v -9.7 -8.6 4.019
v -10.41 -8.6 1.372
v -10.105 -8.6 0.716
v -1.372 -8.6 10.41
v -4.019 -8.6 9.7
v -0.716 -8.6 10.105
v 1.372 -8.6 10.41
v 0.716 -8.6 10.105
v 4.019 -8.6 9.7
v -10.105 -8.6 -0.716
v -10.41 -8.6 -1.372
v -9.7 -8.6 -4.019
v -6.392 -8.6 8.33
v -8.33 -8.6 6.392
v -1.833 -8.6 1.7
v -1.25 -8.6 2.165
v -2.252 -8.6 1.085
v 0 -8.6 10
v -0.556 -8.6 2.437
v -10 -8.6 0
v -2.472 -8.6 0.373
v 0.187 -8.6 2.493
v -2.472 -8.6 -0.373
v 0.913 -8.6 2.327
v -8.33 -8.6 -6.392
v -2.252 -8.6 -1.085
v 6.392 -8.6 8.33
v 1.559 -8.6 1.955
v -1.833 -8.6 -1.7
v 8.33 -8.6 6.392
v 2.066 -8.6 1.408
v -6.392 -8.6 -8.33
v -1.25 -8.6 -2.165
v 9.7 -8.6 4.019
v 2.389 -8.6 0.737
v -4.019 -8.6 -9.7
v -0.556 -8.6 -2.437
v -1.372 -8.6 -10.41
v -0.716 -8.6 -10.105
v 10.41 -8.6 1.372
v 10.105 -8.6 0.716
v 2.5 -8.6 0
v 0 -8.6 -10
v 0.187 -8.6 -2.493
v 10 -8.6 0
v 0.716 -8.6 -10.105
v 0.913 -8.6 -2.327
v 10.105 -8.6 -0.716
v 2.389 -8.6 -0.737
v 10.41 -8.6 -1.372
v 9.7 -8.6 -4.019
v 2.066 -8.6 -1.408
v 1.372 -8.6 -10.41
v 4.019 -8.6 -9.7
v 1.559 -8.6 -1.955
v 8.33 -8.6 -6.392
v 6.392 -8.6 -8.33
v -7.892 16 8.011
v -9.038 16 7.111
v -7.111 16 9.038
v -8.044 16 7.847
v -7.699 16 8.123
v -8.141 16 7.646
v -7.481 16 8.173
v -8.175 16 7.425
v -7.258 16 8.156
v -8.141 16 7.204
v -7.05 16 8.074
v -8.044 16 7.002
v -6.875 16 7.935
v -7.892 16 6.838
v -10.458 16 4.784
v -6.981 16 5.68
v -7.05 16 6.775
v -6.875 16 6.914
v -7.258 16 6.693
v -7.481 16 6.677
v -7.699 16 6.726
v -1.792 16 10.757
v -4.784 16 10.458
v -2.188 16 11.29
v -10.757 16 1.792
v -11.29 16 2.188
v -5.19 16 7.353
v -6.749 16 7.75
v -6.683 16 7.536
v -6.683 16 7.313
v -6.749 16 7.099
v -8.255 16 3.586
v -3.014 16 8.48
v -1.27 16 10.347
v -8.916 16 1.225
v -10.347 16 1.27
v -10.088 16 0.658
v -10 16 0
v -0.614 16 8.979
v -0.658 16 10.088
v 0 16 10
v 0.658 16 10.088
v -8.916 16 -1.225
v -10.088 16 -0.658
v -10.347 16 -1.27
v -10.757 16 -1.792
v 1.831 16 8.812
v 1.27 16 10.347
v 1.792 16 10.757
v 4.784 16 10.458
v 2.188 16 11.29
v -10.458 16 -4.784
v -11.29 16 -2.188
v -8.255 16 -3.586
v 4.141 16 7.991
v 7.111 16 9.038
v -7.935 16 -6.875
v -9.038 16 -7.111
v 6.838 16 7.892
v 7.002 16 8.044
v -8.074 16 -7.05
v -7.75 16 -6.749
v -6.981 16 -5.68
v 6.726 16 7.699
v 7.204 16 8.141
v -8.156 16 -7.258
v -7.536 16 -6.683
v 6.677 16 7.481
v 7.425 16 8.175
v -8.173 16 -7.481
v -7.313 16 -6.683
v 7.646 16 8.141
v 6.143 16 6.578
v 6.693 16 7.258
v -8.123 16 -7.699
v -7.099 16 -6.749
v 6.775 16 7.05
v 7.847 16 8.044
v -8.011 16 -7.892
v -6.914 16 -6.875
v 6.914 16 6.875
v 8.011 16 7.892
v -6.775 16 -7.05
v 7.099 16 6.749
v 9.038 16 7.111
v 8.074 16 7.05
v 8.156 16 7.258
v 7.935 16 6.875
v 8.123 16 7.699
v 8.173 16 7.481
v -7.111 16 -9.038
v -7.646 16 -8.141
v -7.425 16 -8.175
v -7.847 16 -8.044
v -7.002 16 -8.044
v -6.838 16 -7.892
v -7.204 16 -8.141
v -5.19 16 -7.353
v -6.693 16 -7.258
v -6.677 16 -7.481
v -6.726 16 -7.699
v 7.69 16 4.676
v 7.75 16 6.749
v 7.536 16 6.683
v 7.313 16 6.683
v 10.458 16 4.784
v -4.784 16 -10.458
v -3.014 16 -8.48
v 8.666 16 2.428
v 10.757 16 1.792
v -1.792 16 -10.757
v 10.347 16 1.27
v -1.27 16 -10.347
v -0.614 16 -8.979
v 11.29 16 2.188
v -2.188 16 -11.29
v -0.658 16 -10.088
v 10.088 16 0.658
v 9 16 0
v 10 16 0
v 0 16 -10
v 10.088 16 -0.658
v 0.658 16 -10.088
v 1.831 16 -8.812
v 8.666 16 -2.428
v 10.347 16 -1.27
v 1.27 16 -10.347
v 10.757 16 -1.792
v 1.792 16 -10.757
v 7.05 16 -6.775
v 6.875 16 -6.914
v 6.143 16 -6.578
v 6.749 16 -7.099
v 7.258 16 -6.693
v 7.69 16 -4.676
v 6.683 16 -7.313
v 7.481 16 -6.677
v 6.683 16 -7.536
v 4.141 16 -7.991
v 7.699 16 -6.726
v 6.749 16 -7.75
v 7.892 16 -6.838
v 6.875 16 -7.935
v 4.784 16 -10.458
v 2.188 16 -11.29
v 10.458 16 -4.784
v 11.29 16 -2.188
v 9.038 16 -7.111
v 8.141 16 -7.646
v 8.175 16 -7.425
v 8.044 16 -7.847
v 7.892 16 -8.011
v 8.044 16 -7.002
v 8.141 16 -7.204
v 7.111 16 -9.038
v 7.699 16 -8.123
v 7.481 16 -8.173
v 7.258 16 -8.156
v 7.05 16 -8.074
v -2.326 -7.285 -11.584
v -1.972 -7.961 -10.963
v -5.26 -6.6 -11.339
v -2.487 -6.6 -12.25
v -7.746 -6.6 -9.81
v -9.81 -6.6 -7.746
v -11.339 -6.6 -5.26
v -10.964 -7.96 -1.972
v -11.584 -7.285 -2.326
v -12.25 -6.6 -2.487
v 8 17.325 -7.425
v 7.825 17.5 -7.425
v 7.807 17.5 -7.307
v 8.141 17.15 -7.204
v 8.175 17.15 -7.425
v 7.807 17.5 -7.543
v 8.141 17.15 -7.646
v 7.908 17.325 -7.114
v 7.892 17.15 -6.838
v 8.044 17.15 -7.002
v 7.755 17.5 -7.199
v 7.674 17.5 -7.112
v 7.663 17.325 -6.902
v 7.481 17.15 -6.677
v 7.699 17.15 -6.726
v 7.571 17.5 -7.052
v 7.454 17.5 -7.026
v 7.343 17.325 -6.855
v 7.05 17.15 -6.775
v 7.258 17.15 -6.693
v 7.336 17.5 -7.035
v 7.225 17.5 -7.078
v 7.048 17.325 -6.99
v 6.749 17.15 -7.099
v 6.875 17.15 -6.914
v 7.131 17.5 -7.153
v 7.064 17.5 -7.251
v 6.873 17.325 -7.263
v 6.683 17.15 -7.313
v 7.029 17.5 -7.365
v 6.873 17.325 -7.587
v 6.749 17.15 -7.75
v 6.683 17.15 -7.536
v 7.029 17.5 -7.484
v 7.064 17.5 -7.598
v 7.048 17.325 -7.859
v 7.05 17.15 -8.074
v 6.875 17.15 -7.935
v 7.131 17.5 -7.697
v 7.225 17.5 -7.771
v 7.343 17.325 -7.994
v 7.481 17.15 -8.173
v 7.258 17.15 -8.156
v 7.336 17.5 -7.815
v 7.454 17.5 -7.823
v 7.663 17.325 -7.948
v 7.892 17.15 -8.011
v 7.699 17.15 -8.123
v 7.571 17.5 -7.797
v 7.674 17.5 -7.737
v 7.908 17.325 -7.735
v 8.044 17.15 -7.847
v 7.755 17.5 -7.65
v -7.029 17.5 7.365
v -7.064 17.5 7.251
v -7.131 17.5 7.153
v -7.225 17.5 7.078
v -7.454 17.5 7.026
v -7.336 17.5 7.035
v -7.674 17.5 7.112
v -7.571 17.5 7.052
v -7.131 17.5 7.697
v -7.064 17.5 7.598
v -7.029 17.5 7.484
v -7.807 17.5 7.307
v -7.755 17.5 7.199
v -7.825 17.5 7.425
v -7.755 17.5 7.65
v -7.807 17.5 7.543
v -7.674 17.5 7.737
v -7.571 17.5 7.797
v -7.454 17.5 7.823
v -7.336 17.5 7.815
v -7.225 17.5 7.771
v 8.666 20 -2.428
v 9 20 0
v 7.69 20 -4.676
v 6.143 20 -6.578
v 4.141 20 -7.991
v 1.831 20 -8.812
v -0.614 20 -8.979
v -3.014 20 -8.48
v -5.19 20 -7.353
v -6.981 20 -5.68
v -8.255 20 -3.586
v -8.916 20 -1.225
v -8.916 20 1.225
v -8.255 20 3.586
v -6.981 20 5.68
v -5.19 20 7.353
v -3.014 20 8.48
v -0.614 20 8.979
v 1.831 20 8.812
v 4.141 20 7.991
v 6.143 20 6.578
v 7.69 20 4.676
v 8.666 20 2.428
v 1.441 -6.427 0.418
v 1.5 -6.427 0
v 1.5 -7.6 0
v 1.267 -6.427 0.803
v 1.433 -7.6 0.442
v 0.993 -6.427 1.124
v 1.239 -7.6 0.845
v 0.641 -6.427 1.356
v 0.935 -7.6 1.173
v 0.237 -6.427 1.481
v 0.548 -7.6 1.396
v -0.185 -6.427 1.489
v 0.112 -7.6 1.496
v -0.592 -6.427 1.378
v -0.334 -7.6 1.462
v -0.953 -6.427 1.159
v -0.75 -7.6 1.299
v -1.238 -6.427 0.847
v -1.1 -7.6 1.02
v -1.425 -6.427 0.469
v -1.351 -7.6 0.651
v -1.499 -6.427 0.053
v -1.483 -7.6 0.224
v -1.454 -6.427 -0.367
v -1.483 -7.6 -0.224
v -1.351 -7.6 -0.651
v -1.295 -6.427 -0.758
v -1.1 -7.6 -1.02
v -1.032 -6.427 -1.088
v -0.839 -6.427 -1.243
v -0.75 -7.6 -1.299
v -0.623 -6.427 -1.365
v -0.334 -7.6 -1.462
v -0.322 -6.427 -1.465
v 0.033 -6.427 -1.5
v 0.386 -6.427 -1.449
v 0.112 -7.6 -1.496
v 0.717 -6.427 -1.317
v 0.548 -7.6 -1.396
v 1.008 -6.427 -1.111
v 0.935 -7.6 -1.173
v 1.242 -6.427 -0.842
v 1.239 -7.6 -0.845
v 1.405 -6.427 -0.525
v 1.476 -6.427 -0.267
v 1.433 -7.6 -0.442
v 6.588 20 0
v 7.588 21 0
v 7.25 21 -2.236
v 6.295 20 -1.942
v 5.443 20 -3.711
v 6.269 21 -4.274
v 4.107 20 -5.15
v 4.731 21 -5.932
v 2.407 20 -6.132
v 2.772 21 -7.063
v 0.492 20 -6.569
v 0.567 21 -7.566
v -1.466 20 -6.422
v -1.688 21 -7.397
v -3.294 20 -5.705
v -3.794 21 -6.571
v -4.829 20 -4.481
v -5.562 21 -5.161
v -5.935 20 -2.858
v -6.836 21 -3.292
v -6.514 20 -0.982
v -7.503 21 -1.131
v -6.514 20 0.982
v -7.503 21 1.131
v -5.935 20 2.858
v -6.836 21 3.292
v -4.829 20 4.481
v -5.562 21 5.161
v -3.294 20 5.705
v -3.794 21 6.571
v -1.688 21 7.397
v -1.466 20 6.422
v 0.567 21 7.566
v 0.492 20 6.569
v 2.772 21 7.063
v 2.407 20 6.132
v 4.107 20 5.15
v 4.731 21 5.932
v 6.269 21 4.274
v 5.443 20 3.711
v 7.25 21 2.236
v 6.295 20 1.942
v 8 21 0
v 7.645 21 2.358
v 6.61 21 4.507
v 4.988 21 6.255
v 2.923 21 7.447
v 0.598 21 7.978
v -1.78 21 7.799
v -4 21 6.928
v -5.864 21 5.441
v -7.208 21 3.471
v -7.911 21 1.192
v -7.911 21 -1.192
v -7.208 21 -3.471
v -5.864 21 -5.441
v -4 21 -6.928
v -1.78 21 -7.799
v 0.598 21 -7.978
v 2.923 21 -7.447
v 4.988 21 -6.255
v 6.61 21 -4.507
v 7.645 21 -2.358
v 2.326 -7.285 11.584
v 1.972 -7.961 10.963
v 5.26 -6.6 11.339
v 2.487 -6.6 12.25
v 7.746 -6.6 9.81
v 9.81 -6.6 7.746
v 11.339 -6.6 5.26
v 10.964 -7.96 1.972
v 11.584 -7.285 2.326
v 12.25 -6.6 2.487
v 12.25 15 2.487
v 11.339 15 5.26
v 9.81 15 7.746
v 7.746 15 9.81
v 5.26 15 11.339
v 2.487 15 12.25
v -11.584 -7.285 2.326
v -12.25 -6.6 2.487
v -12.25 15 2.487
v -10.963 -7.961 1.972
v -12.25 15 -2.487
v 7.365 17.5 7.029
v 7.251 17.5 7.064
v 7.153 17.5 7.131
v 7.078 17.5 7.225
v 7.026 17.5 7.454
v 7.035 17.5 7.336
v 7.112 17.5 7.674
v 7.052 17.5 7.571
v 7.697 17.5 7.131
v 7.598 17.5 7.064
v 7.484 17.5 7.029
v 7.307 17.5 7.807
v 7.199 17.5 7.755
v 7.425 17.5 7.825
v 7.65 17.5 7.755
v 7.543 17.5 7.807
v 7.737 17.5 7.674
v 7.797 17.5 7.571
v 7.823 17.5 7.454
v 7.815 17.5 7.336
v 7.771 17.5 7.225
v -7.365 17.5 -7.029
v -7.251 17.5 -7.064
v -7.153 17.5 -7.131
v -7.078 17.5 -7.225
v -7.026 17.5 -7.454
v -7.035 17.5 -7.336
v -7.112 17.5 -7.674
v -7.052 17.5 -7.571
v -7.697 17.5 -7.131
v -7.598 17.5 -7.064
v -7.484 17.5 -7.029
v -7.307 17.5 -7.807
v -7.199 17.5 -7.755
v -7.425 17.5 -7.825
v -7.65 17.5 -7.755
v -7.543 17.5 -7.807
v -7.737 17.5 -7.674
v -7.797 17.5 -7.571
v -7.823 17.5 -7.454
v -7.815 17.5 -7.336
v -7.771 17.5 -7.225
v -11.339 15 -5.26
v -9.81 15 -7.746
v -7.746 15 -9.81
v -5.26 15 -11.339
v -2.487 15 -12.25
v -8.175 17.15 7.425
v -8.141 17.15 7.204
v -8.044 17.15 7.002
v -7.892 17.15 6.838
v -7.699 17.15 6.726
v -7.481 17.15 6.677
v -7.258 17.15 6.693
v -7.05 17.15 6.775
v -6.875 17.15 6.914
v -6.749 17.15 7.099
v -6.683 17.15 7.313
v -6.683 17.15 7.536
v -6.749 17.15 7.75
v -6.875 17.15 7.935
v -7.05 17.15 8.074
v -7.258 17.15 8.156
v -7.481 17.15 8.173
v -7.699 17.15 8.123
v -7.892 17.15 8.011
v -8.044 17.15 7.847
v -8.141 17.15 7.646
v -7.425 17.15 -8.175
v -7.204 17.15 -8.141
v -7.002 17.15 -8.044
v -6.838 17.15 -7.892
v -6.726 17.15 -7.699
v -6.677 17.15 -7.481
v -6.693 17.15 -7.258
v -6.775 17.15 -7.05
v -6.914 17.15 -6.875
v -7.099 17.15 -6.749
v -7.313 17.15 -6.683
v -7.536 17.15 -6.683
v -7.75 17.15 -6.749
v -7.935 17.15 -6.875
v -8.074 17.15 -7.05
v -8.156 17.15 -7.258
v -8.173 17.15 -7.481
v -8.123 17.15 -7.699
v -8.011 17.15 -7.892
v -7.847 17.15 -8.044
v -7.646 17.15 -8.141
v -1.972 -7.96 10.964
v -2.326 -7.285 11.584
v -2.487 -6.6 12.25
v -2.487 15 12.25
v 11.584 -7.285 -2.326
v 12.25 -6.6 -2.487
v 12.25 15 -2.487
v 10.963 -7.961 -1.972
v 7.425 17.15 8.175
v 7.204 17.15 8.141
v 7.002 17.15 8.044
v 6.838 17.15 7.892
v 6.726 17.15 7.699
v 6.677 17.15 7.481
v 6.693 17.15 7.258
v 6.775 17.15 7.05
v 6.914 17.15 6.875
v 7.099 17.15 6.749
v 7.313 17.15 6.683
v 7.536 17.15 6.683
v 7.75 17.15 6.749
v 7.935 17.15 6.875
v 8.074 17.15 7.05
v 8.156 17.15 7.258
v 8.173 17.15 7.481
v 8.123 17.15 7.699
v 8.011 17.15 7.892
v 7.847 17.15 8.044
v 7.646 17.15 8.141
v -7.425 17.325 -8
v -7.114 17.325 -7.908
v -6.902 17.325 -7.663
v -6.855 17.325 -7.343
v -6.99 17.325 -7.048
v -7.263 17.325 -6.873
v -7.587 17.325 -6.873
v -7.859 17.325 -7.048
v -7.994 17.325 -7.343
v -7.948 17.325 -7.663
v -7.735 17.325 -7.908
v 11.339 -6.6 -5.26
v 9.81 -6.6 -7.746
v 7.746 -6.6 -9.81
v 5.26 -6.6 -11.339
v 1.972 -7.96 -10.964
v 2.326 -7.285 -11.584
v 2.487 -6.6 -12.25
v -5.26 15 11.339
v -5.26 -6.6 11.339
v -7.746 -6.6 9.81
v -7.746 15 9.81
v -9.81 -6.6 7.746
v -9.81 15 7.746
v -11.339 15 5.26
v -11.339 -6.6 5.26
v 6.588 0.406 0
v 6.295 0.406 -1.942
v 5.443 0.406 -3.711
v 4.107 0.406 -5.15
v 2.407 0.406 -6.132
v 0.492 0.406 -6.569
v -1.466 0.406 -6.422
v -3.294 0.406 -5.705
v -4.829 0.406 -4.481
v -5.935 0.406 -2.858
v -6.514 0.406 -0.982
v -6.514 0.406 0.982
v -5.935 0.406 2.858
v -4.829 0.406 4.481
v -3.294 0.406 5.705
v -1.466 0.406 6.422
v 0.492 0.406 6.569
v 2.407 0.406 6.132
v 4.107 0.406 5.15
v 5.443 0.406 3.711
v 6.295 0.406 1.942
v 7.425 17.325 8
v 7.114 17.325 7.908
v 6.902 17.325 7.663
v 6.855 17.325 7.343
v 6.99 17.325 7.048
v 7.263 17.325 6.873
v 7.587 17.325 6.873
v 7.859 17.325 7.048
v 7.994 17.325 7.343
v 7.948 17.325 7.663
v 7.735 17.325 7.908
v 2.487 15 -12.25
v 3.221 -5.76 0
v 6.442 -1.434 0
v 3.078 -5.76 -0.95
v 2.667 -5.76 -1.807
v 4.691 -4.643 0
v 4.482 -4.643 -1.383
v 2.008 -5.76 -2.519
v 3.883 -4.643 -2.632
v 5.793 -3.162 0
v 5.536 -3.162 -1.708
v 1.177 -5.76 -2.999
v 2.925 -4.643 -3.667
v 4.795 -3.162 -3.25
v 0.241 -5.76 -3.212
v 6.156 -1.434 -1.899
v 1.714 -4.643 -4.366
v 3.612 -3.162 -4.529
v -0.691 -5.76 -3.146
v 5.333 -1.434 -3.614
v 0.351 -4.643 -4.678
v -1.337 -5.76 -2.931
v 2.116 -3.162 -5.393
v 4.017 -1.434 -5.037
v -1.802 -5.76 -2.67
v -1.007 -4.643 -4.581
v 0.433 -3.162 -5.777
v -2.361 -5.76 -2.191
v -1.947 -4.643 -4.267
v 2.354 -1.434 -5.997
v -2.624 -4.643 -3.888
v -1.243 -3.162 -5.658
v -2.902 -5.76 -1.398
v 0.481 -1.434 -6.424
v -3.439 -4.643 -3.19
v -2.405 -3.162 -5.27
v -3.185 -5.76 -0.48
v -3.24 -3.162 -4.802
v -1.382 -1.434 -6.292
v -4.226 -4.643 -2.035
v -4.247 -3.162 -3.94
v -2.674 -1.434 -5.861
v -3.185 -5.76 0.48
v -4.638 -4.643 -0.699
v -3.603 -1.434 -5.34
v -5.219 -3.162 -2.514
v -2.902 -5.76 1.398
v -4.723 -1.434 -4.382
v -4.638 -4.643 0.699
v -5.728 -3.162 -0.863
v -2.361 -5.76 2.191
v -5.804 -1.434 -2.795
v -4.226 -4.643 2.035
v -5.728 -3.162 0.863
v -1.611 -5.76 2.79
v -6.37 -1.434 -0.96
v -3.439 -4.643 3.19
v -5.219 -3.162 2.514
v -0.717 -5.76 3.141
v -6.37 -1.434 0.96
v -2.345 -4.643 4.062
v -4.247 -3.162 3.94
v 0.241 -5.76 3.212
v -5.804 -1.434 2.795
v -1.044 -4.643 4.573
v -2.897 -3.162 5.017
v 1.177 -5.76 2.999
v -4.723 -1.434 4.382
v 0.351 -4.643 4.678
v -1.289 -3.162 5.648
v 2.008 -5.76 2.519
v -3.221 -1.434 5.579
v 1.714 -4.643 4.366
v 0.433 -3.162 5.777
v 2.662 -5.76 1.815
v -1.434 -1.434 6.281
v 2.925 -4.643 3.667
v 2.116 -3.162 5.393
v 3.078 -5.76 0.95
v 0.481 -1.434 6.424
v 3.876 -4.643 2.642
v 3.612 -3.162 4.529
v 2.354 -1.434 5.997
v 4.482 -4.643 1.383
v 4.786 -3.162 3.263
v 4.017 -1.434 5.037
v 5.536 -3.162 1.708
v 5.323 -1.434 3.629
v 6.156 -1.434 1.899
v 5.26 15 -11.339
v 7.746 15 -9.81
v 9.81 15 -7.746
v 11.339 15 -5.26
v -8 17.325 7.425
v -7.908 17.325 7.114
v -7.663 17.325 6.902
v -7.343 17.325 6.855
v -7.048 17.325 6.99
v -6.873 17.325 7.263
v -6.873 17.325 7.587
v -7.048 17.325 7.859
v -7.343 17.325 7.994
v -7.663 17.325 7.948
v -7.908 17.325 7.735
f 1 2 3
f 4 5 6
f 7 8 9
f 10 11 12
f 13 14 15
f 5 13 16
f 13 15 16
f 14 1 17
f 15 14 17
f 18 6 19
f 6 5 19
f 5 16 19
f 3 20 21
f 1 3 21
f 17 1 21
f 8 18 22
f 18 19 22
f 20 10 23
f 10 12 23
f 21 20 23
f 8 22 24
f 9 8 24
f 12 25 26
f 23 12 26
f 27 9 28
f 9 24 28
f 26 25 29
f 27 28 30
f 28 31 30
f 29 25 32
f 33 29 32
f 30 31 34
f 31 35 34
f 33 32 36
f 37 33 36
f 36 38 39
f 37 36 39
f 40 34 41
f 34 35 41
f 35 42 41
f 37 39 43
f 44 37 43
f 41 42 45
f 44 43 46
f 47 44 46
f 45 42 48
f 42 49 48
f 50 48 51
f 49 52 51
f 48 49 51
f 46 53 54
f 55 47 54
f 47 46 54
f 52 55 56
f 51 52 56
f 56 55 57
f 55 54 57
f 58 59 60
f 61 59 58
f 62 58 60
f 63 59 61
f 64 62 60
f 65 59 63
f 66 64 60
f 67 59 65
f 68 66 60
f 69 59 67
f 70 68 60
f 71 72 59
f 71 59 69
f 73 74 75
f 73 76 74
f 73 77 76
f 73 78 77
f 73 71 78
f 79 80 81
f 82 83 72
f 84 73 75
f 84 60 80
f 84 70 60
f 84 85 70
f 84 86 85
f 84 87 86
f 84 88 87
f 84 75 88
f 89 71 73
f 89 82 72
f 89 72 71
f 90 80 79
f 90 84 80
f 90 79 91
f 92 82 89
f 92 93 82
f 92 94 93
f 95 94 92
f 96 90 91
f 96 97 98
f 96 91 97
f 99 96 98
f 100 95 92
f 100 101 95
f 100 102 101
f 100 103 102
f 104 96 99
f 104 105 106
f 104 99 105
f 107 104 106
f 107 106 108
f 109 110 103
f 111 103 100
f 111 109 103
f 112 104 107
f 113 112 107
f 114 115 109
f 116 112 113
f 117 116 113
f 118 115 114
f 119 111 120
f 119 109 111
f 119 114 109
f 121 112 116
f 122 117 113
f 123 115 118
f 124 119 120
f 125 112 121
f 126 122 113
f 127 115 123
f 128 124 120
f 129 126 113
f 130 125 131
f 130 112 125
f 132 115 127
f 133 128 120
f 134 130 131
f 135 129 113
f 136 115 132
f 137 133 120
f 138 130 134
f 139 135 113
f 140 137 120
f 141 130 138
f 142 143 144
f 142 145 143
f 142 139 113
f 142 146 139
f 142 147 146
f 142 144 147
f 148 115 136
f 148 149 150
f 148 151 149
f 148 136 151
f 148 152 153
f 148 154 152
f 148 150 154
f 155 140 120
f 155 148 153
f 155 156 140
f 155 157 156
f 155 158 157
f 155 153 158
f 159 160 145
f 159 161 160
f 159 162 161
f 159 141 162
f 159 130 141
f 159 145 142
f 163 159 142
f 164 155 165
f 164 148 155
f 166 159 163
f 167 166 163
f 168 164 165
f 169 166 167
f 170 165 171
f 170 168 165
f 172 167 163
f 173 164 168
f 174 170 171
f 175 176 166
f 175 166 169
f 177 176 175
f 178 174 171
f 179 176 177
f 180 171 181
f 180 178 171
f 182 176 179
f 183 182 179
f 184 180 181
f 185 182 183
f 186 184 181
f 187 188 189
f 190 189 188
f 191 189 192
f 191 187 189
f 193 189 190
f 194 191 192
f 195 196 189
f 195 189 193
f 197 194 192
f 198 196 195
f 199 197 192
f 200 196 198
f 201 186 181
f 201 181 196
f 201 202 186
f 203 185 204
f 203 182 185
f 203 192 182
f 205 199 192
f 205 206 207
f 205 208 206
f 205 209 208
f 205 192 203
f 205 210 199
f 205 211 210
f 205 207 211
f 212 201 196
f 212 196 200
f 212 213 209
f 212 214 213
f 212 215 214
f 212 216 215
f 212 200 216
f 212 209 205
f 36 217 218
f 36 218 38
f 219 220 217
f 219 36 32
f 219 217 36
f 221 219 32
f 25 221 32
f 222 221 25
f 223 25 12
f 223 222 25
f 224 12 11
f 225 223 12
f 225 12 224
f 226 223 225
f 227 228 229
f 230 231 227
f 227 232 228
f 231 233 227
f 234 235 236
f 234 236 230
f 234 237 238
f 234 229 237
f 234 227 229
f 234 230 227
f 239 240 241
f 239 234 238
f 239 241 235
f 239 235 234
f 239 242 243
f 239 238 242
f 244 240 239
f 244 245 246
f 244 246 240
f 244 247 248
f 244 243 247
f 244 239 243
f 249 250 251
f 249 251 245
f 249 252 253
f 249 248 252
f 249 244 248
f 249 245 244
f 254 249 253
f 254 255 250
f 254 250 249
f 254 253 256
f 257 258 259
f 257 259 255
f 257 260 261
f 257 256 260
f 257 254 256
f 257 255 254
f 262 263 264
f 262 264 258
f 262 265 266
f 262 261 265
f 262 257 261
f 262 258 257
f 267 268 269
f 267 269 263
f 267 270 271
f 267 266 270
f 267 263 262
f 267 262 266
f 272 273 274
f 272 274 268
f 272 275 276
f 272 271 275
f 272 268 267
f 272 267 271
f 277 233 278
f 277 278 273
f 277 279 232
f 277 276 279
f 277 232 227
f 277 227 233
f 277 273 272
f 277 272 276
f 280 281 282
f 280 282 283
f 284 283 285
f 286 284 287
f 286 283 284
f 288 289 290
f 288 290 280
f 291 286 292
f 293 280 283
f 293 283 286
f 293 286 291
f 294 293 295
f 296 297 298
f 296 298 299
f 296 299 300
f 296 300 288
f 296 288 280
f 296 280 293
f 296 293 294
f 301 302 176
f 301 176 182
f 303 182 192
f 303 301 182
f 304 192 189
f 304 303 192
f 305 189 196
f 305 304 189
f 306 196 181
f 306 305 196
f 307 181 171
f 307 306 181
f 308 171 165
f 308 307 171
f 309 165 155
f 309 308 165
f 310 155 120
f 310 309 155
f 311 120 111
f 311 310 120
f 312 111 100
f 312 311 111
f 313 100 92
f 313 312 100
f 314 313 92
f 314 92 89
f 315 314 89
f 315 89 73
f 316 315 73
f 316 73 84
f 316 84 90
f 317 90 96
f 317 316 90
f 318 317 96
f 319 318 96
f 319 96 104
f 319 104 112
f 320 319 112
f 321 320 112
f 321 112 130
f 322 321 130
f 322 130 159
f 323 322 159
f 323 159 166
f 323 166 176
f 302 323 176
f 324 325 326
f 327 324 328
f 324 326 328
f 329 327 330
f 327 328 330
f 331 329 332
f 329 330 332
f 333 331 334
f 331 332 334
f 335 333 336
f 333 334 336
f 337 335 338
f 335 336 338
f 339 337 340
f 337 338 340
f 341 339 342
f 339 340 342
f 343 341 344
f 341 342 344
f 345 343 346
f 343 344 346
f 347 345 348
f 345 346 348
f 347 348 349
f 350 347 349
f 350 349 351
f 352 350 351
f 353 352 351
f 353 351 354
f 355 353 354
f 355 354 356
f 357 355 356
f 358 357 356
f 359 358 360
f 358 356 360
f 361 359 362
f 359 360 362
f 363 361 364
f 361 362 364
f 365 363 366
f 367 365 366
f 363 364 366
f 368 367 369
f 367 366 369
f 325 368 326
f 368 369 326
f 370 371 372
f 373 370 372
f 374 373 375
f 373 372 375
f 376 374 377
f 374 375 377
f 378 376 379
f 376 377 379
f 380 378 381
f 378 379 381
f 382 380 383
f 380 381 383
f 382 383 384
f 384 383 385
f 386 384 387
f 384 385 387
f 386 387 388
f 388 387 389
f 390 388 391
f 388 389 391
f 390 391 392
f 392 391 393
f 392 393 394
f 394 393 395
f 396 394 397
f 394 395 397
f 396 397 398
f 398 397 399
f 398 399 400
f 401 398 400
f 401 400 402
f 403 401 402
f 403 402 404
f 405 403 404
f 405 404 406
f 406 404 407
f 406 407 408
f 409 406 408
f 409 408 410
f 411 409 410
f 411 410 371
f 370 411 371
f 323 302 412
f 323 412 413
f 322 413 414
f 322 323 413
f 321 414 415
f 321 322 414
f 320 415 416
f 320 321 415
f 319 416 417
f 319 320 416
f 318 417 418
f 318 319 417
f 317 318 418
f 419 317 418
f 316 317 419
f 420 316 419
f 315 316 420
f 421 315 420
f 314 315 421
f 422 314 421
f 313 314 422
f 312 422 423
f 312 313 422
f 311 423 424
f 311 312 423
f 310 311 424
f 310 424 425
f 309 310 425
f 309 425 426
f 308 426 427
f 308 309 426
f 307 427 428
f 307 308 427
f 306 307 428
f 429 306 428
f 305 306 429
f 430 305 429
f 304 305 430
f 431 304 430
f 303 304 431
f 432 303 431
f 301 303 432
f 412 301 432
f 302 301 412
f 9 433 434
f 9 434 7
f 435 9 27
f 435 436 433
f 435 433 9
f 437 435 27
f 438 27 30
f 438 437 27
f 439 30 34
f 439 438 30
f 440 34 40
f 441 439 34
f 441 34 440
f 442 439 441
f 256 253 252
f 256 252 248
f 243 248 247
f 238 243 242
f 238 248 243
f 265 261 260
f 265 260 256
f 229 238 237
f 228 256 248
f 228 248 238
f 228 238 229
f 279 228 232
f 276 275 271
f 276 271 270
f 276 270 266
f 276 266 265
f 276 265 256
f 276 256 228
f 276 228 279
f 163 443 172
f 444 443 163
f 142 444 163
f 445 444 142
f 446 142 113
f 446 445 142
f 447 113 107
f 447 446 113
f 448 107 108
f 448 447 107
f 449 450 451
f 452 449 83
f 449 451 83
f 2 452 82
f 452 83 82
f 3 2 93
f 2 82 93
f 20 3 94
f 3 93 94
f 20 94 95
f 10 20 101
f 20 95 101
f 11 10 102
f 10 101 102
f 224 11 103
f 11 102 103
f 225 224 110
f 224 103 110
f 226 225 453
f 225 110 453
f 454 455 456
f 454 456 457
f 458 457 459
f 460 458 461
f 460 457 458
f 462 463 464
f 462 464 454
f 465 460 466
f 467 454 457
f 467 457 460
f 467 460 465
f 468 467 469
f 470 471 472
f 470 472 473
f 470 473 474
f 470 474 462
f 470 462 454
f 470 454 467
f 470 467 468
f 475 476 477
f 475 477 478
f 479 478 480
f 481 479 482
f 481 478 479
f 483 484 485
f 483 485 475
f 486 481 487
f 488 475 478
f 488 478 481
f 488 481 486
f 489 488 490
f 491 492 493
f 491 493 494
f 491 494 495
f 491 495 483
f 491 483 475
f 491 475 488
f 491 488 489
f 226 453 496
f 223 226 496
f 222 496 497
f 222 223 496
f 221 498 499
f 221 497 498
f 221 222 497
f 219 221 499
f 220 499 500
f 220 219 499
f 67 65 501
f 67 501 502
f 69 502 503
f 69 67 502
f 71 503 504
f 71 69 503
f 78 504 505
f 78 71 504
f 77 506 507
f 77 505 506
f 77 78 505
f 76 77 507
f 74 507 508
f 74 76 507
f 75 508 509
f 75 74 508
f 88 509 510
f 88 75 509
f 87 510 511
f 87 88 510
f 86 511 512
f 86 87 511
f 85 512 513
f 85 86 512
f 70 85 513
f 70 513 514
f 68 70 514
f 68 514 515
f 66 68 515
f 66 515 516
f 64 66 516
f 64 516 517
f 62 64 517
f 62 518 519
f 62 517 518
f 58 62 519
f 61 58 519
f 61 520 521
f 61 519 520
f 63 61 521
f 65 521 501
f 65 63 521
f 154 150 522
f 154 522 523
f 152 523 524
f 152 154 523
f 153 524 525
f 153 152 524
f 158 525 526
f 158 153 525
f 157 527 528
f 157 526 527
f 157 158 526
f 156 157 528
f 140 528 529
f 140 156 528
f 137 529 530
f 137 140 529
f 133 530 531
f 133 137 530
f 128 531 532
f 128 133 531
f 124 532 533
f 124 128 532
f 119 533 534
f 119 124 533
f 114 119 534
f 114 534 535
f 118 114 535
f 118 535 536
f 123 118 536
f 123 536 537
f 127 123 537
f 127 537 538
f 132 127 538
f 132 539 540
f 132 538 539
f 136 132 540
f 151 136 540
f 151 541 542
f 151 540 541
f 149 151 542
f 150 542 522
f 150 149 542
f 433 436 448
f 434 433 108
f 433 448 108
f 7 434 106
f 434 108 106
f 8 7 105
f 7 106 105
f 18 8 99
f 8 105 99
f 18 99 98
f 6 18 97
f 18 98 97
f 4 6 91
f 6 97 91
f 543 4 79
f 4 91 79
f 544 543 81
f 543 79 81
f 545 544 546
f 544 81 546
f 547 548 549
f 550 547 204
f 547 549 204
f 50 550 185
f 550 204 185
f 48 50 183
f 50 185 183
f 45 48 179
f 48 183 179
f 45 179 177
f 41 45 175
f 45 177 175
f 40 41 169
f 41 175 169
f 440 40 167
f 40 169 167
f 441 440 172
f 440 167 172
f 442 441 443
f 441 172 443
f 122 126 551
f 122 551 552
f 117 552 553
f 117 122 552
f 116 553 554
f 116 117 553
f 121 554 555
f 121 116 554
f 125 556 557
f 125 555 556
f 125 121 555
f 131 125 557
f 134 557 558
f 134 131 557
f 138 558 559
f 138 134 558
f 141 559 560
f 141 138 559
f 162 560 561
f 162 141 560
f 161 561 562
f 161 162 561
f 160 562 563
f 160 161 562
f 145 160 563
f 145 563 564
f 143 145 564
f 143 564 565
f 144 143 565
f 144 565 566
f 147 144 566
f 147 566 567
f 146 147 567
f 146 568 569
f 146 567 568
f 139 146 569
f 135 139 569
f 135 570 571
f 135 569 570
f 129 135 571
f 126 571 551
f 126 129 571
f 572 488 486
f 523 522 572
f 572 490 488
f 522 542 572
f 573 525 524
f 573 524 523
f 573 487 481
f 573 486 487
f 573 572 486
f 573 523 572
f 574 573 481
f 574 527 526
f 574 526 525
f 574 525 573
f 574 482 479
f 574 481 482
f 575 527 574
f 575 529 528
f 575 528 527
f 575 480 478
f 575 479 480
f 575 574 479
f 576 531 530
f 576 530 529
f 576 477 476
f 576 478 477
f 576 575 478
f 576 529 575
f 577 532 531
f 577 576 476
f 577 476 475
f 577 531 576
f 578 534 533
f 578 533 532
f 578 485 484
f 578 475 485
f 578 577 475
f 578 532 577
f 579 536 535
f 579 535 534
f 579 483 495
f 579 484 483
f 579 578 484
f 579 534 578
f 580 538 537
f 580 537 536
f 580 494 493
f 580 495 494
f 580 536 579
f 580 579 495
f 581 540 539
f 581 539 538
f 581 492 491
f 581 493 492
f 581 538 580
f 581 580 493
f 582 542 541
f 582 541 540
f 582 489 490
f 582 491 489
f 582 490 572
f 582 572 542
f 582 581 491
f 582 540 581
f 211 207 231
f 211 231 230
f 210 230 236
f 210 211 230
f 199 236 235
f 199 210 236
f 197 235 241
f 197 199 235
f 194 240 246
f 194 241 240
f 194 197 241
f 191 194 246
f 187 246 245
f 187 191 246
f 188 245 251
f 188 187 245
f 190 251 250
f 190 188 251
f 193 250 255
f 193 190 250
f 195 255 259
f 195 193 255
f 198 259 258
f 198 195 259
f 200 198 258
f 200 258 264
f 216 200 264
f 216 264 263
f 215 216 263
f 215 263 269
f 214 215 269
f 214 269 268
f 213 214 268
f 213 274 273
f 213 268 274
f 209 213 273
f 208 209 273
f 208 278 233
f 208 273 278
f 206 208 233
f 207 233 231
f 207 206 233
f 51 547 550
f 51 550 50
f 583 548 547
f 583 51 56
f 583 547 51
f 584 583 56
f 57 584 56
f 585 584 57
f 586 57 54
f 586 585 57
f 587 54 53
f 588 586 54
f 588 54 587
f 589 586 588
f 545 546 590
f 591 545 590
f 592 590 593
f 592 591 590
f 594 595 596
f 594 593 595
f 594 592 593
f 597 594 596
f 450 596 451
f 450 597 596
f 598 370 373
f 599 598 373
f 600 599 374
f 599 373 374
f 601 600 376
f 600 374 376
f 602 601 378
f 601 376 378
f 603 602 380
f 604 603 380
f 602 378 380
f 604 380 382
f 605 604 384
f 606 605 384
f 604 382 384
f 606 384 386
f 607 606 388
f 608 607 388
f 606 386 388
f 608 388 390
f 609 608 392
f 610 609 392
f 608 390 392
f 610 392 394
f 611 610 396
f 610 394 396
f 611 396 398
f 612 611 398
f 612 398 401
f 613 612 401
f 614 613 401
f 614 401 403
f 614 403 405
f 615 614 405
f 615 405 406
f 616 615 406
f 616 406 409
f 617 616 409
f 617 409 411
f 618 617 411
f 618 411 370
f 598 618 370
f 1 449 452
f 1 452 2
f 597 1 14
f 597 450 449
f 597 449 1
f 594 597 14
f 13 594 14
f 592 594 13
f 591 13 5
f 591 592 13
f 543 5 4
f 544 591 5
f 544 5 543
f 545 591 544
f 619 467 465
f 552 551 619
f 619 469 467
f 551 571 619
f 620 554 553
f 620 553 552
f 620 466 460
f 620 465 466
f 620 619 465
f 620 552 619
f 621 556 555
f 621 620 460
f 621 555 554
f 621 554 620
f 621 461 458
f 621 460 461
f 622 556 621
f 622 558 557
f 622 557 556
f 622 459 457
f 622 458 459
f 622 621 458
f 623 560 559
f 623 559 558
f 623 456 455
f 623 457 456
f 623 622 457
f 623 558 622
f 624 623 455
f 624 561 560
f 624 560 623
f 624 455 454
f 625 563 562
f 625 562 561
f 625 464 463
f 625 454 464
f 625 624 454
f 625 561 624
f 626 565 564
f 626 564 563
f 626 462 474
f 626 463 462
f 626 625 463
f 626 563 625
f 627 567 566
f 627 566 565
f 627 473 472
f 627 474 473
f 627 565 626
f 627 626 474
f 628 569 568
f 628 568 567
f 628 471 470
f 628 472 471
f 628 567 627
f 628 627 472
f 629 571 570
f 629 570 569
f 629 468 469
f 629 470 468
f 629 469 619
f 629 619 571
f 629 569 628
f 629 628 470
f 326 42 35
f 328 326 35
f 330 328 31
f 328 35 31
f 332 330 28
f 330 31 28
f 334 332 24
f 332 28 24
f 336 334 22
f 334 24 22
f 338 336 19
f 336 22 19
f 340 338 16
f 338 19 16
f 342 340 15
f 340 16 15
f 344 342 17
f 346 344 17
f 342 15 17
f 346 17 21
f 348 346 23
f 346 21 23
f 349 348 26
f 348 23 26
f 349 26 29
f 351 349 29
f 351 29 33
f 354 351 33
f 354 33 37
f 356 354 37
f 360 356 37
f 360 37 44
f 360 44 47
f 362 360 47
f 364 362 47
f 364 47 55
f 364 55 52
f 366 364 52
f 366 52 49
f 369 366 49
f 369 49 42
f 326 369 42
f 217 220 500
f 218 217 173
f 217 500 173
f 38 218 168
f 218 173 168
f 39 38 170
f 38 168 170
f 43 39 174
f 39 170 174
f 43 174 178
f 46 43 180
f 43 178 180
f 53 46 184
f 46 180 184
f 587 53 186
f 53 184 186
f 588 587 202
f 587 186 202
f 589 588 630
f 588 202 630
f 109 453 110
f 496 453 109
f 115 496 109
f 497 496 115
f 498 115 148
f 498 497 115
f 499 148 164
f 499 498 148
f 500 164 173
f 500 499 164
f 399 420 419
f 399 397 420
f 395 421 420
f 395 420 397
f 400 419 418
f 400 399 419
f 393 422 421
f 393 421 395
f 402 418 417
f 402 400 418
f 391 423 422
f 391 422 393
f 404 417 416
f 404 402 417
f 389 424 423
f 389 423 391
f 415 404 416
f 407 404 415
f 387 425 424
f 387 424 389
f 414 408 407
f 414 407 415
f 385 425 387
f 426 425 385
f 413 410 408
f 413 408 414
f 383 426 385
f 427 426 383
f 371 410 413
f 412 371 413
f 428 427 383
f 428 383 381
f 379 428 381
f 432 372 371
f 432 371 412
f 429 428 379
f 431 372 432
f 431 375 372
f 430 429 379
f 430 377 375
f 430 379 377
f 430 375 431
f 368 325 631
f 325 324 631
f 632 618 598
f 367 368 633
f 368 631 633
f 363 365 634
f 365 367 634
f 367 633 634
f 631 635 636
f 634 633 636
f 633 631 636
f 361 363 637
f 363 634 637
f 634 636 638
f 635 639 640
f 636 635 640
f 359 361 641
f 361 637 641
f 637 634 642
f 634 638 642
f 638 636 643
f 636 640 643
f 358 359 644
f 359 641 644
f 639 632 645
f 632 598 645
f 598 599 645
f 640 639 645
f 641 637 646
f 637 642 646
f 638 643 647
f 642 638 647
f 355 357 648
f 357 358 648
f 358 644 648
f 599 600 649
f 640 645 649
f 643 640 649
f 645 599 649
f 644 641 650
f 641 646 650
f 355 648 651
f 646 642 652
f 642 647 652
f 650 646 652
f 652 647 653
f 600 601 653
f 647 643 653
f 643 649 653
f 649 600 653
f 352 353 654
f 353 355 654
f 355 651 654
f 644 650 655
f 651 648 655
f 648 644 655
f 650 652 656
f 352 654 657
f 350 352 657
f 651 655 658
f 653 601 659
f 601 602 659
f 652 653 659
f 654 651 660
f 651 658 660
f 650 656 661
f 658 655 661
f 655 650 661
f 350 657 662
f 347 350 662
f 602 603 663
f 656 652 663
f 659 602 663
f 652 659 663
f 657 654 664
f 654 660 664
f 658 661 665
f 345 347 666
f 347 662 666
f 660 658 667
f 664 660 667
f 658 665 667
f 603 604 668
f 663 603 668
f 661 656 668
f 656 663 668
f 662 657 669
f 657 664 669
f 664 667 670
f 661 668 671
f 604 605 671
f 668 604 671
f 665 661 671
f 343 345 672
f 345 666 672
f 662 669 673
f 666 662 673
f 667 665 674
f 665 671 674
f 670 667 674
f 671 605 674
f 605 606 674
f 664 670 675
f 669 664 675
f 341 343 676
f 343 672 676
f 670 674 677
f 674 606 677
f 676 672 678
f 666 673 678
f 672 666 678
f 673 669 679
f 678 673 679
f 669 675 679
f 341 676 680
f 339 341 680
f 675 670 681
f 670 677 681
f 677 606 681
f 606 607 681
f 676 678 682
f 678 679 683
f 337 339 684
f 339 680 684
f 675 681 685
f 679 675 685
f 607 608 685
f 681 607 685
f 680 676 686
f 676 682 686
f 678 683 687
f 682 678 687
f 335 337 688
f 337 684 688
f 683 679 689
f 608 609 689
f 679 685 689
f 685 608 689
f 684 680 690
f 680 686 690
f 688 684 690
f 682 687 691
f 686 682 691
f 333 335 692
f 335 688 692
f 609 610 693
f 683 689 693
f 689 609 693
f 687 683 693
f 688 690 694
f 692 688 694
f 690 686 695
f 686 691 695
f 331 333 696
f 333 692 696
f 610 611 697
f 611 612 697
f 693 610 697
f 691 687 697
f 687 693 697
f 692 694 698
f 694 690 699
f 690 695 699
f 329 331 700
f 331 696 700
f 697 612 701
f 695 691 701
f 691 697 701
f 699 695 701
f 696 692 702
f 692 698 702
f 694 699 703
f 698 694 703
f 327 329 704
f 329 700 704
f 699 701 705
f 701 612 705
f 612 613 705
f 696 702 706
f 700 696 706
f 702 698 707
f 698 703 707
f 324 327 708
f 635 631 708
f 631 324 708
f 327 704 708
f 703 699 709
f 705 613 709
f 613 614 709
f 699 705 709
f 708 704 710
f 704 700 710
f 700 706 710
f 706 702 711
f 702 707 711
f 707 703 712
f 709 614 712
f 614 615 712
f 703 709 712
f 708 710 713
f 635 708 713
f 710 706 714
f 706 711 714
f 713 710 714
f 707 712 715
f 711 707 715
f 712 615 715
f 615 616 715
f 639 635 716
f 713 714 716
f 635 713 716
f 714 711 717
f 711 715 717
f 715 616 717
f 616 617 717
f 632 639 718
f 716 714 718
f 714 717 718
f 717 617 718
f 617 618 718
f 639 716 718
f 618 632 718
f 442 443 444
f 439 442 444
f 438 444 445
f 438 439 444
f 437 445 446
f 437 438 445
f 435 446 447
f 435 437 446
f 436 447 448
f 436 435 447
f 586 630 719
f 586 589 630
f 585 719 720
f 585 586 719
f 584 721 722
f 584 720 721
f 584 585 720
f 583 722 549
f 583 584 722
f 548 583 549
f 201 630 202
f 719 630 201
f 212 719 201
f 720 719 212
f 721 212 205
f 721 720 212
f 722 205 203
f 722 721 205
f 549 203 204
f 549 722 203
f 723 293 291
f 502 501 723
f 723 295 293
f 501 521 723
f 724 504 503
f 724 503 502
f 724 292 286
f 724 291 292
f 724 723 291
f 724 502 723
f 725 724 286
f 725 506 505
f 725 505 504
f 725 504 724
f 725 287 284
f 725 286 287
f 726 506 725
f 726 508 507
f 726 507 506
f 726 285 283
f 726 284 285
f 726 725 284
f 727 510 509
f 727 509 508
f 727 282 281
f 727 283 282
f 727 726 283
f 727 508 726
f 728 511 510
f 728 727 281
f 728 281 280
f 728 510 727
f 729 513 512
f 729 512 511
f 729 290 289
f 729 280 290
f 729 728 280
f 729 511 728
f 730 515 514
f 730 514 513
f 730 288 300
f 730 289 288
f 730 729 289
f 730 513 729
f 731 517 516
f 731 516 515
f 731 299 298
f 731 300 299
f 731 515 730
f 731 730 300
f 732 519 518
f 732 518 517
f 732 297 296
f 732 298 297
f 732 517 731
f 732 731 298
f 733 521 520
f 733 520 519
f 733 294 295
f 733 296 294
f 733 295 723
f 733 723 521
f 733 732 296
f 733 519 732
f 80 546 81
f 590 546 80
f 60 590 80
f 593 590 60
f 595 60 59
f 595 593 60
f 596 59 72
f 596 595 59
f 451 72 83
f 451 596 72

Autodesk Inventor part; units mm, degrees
ref_plane "YZ Plane" through (0, 0, 0) normal (1, 0, 0) x (0, 1, 0)
ref_plane "XZ Plane" through (0, 0, 0) normal (0, 1, 0) x (-1, 0, 0)
ref_plane "XY Plane" through (0, 0, 0) normal (0, 0, 1) x (1, 0, 0)
sketch "Sketch1" plane through (0, 0, 0) normal (0, 0, 1) x (1, 0, 0)
  line L0 (0, 0) -> (42.0469, 0) construction
  line L1 (0, 0) -> (0, 27.7015) construction
  arc A0 (0, -6.6) -> (6.5875, 0.406) centre (0, 0) ccw
  line L2 (6.5875, 0.406) -> (6.5875, 16)
  line L3 (6.5875, 16) -> (9, 16)
  line L4 (9, 16) -> (9, 21)
  line L5 (9, 21) -> (12.5, 21)
  line L6 (12.5, 21) -> (12.5, -8.6)
  line L7 (12.5, -8.6) -> (0, -8.6)
  line L8 (0, -8.6) -> (0, -6.6)
  line L9 (9, 16) -> (6.5875, 16)
  line L10 (6.5875, 16) -> (6.5875, 21)
  line L11 (6.5875, 21) -> (9, 21)
  line L12 (9, 21) -> (9, 16)
  line L13 (12.5, 16) -> (9, 16)
  line L14 (2, -8.6) -> (0, -8.6)
  line L15 (0, -8.6) -> (0, -6.6)
  dimension "d0" = 13.2
  dimension "d2" = 5
  dimension "d3" = 9
  dimension "d4" = 12.5
  dimension "d5" = 6.5875
  dimension "d6" = 2
  dimension "d35" = 16
revolve "Revolution1" add sketch "Sketch1" angle 360 about axis through (0, 0, 0) along (0, 1, 0) contours A0 L2 L3 L13 L6 L7 L8 | L10 L11 L4 L3
chamfer "Chamfer1" distance 2 angle 45 1 edges at (-12.5, -8.6, 0)
chamfer "Chamfer3" distance 1 angle 45 3 edges at (-9, 21, 0) (-12.5, 16, 0) (-6.5875, 21, 0)
sketch "Sketch2" plane through (0, 16, 0) normal (0, 1, 0) x (1, 0, 0)
  circle A0 centre (0, 0) radius 10.5 construction
  line L0 (0, 0) -> (0, 17.3905) construction
  line L1 (0, 0) -> (14.2747, 14.2747) construction
  circle A1 centre (7.4246, 7.4246) radius 0.75
  circle A2 centre (0, 0) radius 12.5 projected
  circle A3 centre (0, 0) radius 12.5
  circle A4 centre (0, 12.5) radius 2.5
  point P0 (-2.4875, 12.25)
  point P1 (2.4875, 12.25)
  dimension "d17" = 21
  dimension "d29" = 25
  dimension "d18" = 45
  dimension "d19" = 1.5
  dimension "d28" = 5
extrude "Extrusion1" add sketch "Sketch2" along normal blind 1.5 contours A1
chamfer "Chamfer4" distance 0.35 angle 45 1 edges at (6.6746, 17.5, -7.4246)
extrude "Extrusion2" cut sketch "Sketch2" against normal through all contours A4 A2 picked at (0, 11.6481)
pattern_circular "Circular Pattern2" count 4 over 360 about axis through (0, -10, 0) along (0, 1, 0) of "Extrusion1", "Extrusion2", "Chamfer4"
sketch "Sketch3" plane through (0, -8.6, -12.5) normal (0, -1, 0) x (1, 0, 0)
  circle A0 centre (0, 12.5) radius 1.5
  dimension "d37" = 3
extrude "Extrusion3" cut sketch "Sketch3" against normal through all
chamfer "Chamfer5" distance 1 angle 45 1 edges at (-1.5, -8.6, 0)
properties part number "centrifugetool_5mm_tubecap_v2"
